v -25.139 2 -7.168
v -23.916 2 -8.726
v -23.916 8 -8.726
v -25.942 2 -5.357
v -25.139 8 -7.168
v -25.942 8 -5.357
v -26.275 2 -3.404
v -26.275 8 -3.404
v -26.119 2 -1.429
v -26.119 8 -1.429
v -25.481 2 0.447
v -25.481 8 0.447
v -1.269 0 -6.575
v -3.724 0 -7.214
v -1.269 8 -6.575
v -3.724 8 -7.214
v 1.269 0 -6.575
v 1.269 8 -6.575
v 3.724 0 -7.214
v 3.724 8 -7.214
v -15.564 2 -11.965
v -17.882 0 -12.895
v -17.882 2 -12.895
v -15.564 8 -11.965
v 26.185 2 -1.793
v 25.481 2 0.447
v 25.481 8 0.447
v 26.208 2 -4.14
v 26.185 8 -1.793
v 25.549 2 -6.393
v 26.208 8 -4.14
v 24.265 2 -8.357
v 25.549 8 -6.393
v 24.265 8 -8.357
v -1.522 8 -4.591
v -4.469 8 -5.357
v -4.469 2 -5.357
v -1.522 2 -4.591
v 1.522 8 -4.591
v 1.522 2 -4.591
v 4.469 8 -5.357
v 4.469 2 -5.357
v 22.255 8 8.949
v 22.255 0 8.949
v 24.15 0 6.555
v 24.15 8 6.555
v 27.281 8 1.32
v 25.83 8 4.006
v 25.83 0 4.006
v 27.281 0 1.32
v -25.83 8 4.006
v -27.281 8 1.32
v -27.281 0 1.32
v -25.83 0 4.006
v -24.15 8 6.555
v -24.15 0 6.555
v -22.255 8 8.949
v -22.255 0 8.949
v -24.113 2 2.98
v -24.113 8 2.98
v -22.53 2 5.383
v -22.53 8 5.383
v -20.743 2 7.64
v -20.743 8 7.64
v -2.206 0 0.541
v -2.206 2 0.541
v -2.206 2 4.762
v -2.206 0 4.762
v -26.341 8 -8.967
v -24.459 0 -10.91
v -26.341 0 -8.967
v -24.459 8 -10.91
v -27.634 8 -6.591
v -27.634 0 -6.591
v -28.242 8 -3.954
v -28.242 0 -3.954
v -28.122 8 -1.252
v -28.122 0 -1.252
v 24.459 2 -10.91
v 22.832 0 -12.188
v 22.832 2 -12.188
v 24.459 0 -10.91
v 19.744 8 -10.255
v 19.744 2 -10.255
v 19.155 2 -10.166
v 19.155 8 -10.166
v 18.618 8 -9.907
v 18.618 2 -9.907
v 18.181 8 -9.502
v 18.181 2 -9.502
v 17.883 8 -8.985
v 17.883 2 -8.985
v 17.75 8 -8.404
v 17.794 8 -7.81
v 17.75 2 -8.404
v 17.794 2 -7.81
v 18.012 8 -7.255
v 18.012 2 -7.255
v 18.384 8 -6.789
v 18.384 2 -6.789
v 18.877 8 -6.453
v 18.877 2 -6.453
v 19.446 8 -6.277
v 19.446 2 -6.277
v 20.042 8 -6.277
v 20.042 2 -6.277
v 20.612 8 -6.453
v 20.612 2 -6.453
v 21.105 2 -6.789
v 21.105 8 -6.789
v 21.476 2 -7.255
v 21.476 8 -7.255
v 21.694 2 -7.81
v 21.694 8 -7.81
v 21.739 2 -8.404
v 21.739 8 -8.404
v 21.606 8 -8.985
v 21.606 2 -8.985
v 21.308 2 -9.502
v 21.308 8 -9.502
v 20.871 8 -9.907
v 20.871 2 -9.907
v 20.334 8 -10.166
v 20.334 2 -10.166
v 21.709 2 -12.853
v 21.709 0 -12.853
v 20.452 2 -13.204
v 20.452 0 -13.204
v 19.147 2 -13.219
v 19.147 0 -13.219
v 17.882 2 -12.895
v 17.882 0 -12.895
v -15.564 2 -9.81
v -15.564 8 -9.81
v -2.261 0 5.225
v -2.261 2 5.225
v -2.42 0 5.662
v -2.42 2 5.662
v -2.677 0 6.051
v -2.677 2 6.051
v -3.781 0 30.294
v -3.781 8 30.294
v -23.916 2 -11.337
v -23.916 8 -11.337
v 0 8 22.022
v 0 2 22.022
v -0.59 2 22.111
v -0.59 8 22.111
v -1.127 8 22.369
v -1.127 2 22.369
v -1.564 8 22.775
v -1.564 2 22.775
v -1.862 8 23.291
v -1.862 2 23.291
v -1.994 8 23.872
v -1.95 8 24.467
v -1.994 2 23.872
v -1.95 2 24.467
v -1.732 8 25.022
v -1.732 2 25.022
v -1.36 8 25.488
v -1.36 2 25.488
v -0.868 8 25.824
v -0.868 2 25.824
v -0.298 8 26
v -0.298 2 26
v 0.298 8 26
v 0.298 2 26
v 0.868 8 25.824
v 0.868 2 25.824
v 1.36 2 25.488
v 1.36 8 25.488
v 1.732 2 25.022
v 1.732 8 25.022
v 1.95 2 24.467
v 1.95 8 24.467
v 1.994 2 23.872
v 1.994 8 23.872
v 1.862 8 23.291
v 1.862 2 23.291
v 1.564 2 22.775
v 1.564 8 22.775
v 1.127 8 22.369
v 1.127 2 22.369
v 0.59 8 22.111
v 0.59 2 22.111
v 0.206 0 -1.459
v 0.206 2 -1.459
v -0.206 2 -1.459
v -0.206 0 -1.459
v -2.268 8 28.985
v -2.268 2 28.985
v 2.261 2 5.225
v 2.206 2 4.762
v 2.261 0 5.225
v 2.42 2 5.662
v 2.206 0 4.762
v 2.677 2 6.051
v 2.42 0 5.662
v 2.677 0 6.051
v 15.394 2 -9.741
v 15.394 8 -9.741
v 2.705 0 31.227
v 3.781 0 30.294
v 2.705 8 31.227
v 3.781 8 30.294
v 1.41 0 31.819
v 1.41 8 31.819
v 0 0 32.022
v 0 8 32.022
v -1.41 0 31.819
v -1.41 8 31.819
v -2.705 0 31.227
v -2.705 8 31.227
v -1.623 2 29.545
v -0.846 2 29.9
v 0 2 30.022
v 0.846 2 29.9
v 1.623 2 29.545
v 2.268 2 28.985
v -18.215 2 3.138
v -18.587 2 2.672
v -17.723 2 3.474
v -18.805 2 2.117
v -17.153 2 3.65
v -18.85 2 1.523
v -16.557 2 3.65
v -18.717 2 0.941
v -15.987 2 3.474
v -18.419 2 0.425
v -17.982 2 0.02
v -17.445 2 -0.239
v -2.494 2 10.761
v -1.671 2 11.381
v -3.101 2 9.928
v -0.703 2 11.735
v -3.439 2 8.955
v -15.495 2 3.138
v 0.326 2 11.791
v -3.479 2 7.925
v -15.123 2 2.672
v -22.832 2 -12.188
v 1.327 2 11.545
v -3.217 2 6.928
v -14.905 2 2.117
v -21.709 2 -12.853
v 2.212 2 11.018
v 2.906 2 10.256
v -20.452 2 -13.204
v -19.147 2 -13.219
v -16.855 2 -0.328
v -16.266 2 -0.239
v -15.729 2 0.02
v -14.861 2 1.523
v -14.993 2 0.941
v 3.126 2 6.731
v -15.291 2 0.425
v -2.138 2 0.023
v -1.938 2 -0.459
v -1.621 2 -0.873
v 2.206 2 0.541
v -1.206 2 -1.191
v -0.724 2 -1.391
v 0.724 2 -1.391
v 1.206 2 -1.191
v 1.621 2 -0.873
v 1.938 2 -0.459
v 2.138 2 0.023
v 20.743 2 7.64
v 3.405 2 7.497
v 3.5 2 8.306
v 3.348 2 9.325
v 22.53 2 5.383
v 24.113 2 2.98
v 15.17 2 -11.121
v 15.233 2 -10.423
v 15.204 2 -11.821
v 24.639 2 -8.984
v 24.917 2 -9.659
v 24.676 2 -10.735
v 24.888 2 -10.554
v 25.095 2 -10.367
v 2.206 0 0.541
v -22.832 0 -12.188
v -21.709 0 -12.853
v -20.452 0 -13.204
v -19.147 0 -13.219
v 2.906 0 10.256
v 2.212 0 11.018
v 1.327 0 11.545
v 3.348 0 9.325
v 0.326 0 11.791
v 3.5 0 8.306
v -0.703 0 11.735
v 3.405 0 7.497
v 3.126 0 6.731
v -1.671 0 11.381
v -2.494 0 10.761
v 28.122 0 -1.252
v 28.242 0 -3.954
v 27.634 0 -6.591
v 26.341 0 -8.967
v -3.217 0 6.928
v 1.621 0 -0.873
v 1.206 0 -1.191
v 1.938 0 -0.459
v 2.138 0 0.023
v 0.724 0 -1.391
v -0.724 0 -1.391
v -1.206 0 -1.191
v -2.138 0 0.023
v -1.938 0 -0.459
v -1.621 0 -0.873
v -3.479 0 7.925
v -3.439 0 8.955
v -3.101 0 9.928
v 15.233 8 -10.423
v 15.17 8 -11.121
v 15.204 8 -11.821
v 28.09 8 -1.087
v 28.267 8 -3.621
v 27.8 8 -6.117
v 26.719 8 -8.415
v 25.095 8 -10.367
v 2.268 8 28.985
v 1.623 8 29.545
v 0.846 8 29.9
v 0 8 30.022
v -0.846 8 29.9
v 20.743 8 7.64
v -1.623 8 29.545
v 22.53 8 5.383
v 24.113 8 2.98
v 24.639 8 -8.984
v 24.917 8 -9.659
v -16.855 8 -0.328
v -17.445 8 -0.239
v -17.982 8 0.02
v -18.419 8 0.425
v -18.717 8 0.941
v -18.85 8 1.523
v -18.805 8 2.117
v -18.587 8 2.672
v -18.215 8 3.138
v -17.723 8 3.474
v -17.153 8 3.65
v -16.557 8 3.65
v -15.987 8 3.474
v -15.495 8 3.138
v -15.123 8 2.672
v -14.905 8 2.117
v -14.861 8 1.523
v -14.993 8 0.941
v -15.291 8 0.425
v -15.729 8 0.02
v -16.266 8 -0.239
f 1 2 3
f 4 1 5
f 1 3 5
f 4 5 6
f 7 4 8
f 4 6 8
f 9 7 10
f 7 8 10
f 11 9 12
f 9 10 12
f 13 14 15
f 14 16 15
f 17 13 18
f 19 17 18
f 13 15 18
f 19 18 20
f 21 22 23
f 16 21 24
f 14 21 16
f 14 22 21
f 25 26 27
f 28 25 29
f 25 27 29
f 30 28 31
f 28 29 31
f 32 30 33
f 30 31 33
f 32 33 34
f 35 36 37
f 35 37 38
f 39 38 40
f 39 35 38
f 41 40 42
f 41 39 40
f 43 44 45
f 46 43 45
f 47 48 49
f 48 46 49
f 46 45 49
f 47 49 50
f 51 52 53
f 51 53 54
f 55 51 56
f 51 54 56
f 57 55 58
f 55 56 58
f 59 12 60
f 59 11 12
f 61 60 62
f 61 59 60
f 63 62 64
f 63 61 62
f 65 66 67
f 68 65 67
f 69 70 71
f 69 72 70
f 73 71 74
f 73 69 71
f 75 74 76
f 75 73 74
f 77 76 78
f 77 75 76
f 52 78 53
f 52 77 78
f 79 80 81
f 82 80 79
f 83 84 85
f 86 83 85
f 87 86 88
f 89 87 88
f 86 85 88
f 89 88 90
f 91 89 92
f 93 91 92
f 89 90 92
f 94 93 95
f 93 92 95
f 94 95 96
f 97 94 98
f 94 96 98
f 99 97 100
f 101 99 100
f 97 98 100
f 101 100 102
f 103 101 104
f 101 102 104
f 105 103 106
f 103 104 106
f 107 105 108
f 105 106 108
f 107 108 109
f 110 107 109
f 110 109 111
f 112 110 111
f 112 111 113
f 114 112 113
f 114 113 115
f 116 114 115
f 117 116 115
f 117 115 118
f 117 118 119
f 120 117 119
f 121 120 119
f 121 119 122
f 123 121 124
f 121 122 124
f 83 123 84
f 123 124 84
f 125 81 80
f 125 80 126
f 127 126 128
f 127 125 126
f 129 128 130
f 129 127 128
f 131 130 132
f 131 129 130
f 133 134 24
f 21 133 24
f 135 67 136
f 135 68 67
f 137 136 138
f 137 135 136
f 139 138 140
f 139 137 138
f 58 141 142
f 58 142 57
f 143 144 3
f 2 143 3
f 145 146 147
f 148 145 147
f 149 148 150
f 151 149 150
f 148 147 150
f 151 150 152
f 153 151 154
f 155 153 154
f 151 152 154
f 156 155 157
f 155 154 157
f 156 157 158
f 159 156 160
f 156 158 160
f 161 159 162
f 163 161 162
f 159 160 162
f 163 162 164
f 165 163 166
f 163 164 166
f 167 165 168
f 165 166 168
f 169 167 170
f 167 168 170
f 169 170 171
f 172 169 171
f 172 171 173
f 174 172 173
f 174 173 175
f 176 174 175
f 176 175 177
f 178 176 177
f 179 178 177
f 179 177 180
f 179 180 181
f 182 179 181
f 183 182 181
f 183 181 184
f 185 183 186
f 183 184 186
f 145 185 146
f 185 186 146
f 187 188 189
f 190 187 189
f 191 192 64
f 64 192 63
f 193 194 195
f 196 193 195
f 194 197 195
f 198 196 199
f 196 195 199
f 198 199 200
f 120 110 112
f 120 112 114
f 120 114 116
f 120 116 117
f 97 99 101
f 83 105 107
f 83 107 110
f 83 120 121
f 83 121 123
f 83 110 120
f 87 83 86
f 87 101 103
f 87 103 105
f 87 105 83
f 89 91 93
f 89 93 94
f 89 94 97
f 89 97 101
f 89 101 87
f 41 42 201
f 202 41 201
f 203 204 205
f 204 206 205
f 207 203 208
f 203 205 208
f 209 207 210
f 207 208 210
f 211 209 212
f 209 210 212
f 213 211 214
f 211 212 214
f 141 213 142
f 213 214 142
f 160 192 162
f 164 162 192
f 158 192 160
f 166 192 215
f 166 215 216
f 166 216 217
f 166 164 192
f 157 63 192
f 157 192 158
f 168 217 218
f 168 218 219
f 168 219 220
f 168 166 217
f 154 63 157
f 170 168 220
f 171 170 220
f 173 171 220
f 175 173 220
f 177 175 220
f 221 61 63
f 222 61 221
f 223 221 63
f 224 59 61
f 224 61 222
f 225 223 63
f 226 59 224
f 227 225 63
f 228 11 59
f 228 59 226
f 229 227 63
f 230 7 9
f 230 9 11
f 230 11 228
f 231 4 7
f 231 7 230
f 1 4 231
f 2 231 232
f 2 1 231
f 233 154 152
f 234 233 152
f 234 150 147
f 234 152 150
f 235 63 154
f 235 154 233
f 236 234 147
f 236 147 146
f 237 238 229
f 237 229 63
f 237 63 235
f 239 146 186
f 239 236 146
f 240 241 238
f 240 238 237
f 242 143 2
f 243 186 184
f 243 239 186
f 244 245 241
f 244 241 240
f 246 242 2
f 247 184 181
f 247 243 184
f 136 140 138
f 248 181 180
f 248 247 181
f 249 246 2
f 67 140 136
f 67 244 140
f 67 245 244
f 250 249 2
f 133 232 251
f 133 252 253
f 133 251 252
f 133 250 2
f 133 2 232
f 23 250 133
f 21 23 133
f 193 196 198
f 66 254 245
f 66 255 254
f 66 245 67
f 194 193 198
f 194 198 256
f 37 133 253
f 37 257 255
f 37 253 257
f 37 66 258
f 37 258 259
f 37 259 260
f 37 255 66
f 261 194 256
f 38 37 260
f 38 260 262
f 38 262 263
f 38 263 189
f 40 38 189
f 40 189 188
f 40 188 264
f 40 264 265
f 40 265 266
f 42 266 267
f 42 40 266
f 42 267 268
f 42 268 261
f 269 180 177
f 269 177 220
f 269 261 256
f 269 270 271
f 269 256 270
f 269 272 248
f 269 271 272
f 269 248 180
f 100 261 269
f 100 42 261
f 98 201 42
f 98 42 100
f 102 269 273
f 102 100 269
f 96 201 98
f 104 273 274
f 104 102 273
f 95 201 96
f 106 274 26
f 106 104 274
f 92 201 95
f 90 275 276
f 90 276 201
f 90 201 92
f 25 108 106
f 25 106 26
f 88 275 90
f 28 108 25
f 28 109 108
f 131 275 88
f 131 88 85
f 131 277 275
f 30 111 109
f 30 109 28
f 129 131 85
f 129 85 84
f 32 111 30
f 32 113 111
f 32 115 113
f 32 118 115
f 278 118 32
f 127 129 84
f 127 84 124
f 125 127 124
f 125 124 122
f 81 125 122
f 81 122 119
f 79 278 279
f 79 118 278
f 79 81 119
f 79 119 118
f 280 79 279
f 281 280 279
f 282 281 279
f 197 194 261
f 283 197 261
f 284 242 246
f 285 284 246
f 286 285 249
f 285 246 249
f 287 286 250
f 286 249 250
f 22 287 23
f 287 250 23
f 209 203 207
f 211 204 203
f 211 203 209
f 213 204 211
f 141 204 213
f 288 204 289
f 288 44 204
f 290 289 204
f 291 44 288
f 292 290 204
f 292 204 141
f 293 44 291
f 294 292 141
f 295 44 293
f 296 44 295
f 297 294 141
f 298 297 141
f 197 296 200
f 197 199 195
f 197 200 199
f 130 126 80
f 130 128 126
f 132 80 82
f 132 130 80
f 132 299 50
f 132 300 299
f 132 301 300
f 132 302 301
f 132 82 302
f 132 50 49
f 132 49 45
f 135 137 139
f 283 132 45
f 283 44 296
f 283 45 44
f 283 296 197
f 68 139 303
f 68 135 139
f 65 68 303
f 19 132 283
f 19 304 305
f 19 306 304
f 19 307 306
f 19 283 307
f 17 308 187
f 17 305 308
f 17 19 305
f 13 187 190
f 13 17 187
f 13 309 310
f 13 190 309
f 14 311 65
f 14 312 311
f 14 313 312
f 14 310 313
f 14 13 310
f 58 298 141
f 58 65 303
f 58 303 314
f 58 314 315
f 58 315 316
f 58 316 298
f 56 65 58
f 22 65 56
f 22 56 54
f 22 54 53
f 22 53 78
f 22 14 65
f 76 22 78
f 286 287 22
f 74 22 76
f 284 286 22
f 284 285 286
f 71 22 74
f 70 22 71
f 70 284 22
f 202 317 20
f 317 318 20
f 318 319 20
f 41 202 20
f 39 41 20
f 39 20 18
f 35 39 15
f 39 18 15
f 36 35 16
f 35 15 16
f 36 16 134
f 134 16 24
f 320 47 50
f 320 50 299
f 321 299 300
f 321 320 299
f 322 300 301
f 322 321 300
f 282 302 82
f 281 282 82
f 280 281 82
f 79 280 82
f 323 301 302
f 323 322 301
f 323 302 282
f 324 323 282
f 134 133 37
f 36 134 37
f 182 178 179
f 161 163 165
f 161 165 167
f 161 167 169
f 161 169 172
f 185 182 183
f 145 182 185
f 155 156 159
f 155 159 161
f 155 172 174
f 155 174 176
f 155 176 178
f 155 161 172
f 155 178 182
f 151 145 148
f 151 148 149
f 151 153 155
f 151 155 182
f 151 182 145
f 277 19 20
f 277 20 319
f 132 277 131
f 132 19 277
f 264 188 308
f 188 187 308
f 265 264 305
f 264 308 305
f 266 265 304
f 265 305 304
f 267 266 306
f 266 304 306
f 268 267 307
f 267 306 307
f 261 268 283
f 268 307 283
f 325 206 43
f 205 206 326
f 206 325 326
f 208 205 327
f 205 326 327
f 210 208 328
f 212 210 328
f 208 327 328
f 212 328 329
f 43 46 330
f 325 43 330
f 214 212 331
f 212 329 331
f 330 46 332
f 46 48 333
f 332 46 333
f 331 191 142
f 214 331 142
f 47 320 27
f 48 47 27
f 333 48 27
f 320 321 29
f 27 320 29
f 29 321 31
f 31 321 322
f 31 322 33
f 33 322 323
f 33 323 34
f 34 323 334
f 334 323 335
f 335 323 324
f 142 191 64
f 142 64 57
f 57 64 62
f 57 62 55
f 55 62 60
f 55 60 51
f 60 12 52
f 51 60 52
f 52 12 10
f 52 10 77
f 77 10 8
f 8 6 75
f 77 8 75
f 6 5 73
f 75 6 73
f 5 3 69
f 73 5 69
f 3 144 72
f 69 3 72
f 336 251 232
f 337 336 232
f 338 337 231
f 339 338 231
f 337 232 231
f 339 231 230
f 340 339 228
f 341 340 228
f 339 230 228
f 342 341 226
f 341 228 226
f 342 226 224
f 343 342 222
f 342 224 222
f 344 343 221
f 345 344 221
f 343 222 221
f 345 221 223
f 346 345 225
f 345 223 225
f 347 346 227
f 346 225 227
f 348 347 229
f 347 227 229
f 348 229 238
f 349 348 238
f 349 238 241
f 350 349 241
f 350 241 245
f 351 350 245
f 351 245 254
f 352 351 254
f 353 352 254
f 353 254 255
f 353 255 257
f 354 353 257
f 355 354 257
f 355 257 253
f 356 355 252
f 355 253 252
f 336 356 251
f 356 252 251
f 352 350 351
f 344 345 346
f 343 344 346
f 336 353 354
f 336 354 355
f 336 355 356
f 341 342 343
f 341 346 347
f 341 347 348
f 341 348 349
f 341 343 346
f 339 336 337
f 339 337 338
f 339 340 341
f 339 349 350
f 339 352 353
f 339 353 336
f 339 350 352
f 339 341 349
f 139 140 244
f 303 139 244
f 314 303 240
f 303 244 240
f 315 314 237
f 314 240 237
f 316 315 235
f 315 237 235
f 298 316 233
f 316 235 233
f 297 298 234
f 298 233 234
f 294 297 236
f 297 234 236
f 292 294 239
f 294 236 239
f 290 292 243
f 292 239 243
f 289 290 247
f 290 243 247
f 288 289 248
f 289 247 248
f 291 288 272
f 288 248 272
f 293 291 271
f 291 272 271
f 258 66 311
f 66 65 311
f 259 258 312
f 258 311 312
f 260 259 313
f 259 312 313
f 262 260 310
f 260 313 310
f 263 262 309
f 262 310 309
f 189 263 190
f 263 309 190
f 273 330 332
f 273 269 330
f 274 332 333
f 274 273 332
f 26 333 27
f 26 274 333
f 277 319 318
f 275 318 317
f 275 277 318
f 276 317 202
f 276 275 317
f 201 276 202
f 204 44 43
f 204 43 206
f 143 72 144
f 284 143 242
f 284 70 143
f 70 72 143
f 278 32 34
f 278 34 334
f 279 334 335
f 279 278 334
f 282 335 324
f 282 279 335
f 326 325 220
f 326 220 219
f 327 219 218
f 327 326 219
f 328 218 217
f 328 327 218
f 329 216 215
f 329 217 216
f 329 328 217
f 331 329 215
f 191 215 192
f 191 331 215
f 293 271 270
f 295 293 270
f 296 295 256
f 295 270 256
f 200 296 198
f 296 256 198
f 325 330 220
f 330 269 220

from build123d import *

# Parameters (mm, degrees)
SALIENTE_EXTRUIR1_DEPTH = 8
REDONDEO3_R             = 5
REDONDEO4_R             = 5
REDONDEO5_R             = 35
REDONDEO6_R             = 10
REDONDEO7_R             = 10
VACIADO1_T              = -2
CROQUIS2_R              = 2
SALIENTE_EXTRUIR2_DEPTH = 6
CROQUIS3_R              = 5
CORTAR_EXTRUIR1_DEPTH   = 10
CROQUIS4_R              = 2
SALIENTE_EXTRUIR4_DEPTH = 6
CORTAR_EXTRUIR2_START   = 10
CORTAR_EXTRUIR2_DEPTH   = 10
CROQUIS6_R              = 2
SALIENTE_EXTRUIR5_DEPTH = 6
CROQUIS7_R              = 2.5
CORTAR_EXTRUIR3_DEPTH   = 10
CORTAR_EXTRUIR4_DEPTH   = 5
REDONDEO8_R             = 2


with BuildPart() as part:
    # Croquis1 → Saliente-Extruir1 (new body)
    with BuildSketch(Plane(origin=(0, 0, 0), x_dir=(1, 0, 0), z_dir=(0, 1, 0))):
        Polygon((-30, 0), (-30, 6.559995295), (-20.5612792, 13.970160587), (0, 5.719083833), (20.5612792, 13.970160587), (30, 6.559995295), (30, 0), (0, -34.662162162), align=None)
    extrude(amount=SALIENTE_EXTRUIR1_DEPTH)

    # Redondeo3
    redondeo3_edges = [part.edges().sort_by_distance(p)[0] for p in [
        (0, 4, 34.662162162),
    ]]
    fillet(redondeo3_edges, radius=REDONDEO3_R)

    # Redondeo4
    redondeo4_edges = [part.edges().sort_by_distance(p)[0] for p in [
        (-20.5612792, 4, -13.970160587),
        (20.5612792, 4, -13.970160587),
    ]]
    fillet(redondeo4_edges, radius=REDONDEO4_R)

    # Redondeo5
    # the kernel refuses this fillet: 35 mm, written as the material it takes off along each edge
    with BuildSketch(Plane(origin=(-30, -29.587762227, 0), x_dir=(0.6544253650435297, 0, 0.7561266042056997), z_dir=(0, 1, 0))) as redondeo5_piece_1:
        with BuildLine():
            CenterArc((11.835104891, 35), REDONDEO5_R, 241.323383223, 28.676616777)
            Line((-4.960186966, 4.293027316), (-5.296092803, 3.678887862))
            ThreePointArc((-5.296092803, 3.678887862), (-2.938191238, 1.617225035), (-0.458097756, -0.529288623))
            Line((-0.458097756, -0.529288623), (0, -0.7))
            Line((0, -0.7), (11.835104891, -0.7))
            Line((11.835104891, -0.7), (11.835104891, 0))
        make_face()
    extrude(amount=67.175524454, mode=Mode.SUBTRACT)
    with BuildSketch(Plane(origin=(30, -29.587762227, 0), x_dir=(0, 0, -1), z_dir=(0, 1, 0))) as redondeo5_piece_2:
        with BuildLine():
            CenterArc((13.956050105, 34.209623986), REDONDEO5_R, 229.12390756, 28.676616777)
            Line((-8.948837672, 7.745192839), (-9.406935427, 7.215904216))
            Line((-9.406935427, 7.215904216), (-0.458097756, -0.529288623))
            Line((-0.458097756, -0.529288623), (0, -0.7))
            ThreePointArc((0, -0.7), (3.279997647, -0.7), (6.412074199, -0.68419248))
            Line((6.412074199, -0.68419248), (6.559995295, 0))
        make_face()
    extrude(amount=67.175524454, mode=Mode.SUBTRACT)

    # Redondeo6
    redondeo6_edges = [part.edges().sort_by_distance(p)[0] for p in [
        (-30, 4, -6.559995295),
        (30, 4, -6.559995295),
    ]]
    fillet(redondeo6_edges, radius=REDONDEO6_R)

    # Redondeo7
    redondeo7_edges = [part.edges().sort_by_distance(p)[0] for p in [
        (0, 4, -5.719083833),
    ]]
    fillet(redondeo7_edges, radius=REDONDEO7_R)

    # Vaciado1
    vaciado1_openings = [part.faces().sort_by_distance(p)[0] for p in [
        (0, 8, 5.527661799),
    ]]
    offset(amount=VACIADO1_T, openings=vaciado1_openings, kind=Kind.INTERSECTION)

    # Croquis2 → Saliente-Extruir2 (add, through all)
    with BuildSketch(Plane(origin=(0, 2, 0), x_dir=(1, 0, 0), z_dir=(0, 1, 0))):
        with Locations(Location((0, -24.021871509, 0), (0, 0, 90))):
            Circle(CROQUIS2_R)
    extrude(amount=SALIENTE_EXTRUIR2_DEPTH)

    # Croquis3 → Cortar-Extruir1 (cut)
    with BuildSketch(Plane(origin=(0, 2, 0), x_dir=(1, 0, 0), z_dir=(0, 1, 0))):
        with Locations((20.168821407, 11.224565194)):
            Circle(CROQUIS3_R)
    extrude(amount=CORTAR_EXTRUIR1_DEPTH, mode=Mode.SUBTRACT)

    # Croquis4 → Saliente-Extruir4 (add, through all)
    with BuildSketch(Plane(origin=(0, 2, 0), x_dir=(1, 0, 0), z_dir=(0, 1, 0))):
        with Locations(Location((19.744313659, 8.254751535, 0), (0, 0, 90))):
            Circle(CROQUIS4_R)
    extrude(amount=SALIENTE_EXTRUIR4_DEPTH)

    # Croquis5 → Cortar-Extruir2 (cut)
    with BuildSketch(Plane(origin=(0, 2, 0), x_dir=(1, 0, 0), z_dir=(0, 1, 0)).offset(CORTAR_EXTRUIR2_START)):
        with BuildLine():
            Line((-23.915581781, 14.17421255), (-23.915581781, 8.72634885))
            ThreePointArc((-23.915581781, 8.72634885), (-23.578448406, 9.04178192), (-23.22368003, 9.33724145))
            Line((-23.22368003, 9.33724145), (-21.596854982, 10.614431735))
            ThreePointArc((-21.596854982, 10.614431735), (-20.168821407, 11.224565194), (-18.627041323, 11.038939482))
            Line((-18.627041323, 11.038939482), (-15.564418219, 9.809933346))
            Line((-15.564418219, 9.809933346), (-15.564418219, 14.17421255))
            Line((-15.564418219, 14.17421255), (-23.915581781, 14.17421255))
        make_face()
    extrude(amount=-CORTAR_EXTRUIR2_DEPTH, mode=Mode.SUBTRACT)

    # Croquis6 → Saliente-Extruir5 (add, through all)
    with BuildSketch(Plane(origin=(0, 2, 0), x_dir=(1, 0, 0), z_dir=(0, 1, 0))):
        with Locations(Location((-16.8551421, -1.672109492, 0), (0, 0, 90))):
            Circle(CROQUIS6_R)
    extrude(amount=SALIENTE_EXTRUIR5_DEPTH)

    # Croquis7 → Cortar-Extruir3 (cut)
    with BuildSketch(Plane(origin=(0, 2, 0), x_dir=(1, 0, 0), z_dir=(0, 1, 0))):
        with Locations(Location((0, -8.30592839, 0), (0, 0, 270))):
            Circle(CROQUIS7_R)
    extrude(amount=-CORTAR_EXTRUIR3_DEPTH, mode=Mode.SUBTRACT)

    # Croquis8 → Cortar-Extruir4 (cut)
    with BuildSketch(Plane(origin=(0, 2, 0), x_dir=(1, 0, 0), z_dir=(0, 1, 0))):
        with BuildLine():
            Line((2.20642721, 1.459281861), (-2.20642721, 1.459281861))
            Line((-2.20642721, 1.459281861), (-2.20642721, -5.589003848))
            ThreePointArc((-2.20642721, -5.589003848), (0, -4.80592839), (2.20642721, -5.589003848))
            Line((2.20642721, -5.589003848), (2.20642721, 1.459281861))
        make_face()
        with BuildLine():
            ThreePointArc((2.20642721, -5.589003848), (0, -4.80592839), (-2.20642721, -5.589003848))
            Line((-2.20642721, -5.589003848), (-2.20642721, -7.130479979))
            ThreePointArc((-2.20642721, -7.130479979), (0, -5.80592839), (2.20642721, -7.130479979))
            Line((2.20642721, -7.130479979), (2.20642721, -5.589003848))
        make_face()
        with BuildLine():
            Line((-2.20642721, -7.130479979), (-2.20642721, -5.589003848))
            ThreePointArc((-2.20642721, -5.589003848), (-1.504577144, -11.46603086), (3.5, -8.30592839))
            ThreePointArc((3.5, -8.30592839), (3.160102469, -6.801351246), (2.20642721, -5.589003848))
            Line((2.20642721, -5.589003848), (2.20642721, -7.130479979))
            ThreePointArc((2.20642721, -7.130479979), (2.425496653, -7.700151214), (2.5, -8.30592839))
            ThreePointArc((2.5, -8.30592839), (-0.605777176, -10.731425043), (-2.20642721, -7.130479979))
        make_face()
    extrude(amount=-CORTAR_EXTRUIR4_DEPTH, mode=Mode.SUBTRACT)

    # Redondeo8
    redondeo8_edges = [part.edges().sort_by_distance(p)[0] for p in [
        (-2.20642721, 1, 5.589003848),
        (-2.20642721, 1, -1.459281861),
        (2.20642721, 1, -1.459281861),
        (2.20642721, 1, 5.589003848),
    ]]
    fillet(redondeo8_edges, radius=REDONDEO8_R)


solid = part.part
